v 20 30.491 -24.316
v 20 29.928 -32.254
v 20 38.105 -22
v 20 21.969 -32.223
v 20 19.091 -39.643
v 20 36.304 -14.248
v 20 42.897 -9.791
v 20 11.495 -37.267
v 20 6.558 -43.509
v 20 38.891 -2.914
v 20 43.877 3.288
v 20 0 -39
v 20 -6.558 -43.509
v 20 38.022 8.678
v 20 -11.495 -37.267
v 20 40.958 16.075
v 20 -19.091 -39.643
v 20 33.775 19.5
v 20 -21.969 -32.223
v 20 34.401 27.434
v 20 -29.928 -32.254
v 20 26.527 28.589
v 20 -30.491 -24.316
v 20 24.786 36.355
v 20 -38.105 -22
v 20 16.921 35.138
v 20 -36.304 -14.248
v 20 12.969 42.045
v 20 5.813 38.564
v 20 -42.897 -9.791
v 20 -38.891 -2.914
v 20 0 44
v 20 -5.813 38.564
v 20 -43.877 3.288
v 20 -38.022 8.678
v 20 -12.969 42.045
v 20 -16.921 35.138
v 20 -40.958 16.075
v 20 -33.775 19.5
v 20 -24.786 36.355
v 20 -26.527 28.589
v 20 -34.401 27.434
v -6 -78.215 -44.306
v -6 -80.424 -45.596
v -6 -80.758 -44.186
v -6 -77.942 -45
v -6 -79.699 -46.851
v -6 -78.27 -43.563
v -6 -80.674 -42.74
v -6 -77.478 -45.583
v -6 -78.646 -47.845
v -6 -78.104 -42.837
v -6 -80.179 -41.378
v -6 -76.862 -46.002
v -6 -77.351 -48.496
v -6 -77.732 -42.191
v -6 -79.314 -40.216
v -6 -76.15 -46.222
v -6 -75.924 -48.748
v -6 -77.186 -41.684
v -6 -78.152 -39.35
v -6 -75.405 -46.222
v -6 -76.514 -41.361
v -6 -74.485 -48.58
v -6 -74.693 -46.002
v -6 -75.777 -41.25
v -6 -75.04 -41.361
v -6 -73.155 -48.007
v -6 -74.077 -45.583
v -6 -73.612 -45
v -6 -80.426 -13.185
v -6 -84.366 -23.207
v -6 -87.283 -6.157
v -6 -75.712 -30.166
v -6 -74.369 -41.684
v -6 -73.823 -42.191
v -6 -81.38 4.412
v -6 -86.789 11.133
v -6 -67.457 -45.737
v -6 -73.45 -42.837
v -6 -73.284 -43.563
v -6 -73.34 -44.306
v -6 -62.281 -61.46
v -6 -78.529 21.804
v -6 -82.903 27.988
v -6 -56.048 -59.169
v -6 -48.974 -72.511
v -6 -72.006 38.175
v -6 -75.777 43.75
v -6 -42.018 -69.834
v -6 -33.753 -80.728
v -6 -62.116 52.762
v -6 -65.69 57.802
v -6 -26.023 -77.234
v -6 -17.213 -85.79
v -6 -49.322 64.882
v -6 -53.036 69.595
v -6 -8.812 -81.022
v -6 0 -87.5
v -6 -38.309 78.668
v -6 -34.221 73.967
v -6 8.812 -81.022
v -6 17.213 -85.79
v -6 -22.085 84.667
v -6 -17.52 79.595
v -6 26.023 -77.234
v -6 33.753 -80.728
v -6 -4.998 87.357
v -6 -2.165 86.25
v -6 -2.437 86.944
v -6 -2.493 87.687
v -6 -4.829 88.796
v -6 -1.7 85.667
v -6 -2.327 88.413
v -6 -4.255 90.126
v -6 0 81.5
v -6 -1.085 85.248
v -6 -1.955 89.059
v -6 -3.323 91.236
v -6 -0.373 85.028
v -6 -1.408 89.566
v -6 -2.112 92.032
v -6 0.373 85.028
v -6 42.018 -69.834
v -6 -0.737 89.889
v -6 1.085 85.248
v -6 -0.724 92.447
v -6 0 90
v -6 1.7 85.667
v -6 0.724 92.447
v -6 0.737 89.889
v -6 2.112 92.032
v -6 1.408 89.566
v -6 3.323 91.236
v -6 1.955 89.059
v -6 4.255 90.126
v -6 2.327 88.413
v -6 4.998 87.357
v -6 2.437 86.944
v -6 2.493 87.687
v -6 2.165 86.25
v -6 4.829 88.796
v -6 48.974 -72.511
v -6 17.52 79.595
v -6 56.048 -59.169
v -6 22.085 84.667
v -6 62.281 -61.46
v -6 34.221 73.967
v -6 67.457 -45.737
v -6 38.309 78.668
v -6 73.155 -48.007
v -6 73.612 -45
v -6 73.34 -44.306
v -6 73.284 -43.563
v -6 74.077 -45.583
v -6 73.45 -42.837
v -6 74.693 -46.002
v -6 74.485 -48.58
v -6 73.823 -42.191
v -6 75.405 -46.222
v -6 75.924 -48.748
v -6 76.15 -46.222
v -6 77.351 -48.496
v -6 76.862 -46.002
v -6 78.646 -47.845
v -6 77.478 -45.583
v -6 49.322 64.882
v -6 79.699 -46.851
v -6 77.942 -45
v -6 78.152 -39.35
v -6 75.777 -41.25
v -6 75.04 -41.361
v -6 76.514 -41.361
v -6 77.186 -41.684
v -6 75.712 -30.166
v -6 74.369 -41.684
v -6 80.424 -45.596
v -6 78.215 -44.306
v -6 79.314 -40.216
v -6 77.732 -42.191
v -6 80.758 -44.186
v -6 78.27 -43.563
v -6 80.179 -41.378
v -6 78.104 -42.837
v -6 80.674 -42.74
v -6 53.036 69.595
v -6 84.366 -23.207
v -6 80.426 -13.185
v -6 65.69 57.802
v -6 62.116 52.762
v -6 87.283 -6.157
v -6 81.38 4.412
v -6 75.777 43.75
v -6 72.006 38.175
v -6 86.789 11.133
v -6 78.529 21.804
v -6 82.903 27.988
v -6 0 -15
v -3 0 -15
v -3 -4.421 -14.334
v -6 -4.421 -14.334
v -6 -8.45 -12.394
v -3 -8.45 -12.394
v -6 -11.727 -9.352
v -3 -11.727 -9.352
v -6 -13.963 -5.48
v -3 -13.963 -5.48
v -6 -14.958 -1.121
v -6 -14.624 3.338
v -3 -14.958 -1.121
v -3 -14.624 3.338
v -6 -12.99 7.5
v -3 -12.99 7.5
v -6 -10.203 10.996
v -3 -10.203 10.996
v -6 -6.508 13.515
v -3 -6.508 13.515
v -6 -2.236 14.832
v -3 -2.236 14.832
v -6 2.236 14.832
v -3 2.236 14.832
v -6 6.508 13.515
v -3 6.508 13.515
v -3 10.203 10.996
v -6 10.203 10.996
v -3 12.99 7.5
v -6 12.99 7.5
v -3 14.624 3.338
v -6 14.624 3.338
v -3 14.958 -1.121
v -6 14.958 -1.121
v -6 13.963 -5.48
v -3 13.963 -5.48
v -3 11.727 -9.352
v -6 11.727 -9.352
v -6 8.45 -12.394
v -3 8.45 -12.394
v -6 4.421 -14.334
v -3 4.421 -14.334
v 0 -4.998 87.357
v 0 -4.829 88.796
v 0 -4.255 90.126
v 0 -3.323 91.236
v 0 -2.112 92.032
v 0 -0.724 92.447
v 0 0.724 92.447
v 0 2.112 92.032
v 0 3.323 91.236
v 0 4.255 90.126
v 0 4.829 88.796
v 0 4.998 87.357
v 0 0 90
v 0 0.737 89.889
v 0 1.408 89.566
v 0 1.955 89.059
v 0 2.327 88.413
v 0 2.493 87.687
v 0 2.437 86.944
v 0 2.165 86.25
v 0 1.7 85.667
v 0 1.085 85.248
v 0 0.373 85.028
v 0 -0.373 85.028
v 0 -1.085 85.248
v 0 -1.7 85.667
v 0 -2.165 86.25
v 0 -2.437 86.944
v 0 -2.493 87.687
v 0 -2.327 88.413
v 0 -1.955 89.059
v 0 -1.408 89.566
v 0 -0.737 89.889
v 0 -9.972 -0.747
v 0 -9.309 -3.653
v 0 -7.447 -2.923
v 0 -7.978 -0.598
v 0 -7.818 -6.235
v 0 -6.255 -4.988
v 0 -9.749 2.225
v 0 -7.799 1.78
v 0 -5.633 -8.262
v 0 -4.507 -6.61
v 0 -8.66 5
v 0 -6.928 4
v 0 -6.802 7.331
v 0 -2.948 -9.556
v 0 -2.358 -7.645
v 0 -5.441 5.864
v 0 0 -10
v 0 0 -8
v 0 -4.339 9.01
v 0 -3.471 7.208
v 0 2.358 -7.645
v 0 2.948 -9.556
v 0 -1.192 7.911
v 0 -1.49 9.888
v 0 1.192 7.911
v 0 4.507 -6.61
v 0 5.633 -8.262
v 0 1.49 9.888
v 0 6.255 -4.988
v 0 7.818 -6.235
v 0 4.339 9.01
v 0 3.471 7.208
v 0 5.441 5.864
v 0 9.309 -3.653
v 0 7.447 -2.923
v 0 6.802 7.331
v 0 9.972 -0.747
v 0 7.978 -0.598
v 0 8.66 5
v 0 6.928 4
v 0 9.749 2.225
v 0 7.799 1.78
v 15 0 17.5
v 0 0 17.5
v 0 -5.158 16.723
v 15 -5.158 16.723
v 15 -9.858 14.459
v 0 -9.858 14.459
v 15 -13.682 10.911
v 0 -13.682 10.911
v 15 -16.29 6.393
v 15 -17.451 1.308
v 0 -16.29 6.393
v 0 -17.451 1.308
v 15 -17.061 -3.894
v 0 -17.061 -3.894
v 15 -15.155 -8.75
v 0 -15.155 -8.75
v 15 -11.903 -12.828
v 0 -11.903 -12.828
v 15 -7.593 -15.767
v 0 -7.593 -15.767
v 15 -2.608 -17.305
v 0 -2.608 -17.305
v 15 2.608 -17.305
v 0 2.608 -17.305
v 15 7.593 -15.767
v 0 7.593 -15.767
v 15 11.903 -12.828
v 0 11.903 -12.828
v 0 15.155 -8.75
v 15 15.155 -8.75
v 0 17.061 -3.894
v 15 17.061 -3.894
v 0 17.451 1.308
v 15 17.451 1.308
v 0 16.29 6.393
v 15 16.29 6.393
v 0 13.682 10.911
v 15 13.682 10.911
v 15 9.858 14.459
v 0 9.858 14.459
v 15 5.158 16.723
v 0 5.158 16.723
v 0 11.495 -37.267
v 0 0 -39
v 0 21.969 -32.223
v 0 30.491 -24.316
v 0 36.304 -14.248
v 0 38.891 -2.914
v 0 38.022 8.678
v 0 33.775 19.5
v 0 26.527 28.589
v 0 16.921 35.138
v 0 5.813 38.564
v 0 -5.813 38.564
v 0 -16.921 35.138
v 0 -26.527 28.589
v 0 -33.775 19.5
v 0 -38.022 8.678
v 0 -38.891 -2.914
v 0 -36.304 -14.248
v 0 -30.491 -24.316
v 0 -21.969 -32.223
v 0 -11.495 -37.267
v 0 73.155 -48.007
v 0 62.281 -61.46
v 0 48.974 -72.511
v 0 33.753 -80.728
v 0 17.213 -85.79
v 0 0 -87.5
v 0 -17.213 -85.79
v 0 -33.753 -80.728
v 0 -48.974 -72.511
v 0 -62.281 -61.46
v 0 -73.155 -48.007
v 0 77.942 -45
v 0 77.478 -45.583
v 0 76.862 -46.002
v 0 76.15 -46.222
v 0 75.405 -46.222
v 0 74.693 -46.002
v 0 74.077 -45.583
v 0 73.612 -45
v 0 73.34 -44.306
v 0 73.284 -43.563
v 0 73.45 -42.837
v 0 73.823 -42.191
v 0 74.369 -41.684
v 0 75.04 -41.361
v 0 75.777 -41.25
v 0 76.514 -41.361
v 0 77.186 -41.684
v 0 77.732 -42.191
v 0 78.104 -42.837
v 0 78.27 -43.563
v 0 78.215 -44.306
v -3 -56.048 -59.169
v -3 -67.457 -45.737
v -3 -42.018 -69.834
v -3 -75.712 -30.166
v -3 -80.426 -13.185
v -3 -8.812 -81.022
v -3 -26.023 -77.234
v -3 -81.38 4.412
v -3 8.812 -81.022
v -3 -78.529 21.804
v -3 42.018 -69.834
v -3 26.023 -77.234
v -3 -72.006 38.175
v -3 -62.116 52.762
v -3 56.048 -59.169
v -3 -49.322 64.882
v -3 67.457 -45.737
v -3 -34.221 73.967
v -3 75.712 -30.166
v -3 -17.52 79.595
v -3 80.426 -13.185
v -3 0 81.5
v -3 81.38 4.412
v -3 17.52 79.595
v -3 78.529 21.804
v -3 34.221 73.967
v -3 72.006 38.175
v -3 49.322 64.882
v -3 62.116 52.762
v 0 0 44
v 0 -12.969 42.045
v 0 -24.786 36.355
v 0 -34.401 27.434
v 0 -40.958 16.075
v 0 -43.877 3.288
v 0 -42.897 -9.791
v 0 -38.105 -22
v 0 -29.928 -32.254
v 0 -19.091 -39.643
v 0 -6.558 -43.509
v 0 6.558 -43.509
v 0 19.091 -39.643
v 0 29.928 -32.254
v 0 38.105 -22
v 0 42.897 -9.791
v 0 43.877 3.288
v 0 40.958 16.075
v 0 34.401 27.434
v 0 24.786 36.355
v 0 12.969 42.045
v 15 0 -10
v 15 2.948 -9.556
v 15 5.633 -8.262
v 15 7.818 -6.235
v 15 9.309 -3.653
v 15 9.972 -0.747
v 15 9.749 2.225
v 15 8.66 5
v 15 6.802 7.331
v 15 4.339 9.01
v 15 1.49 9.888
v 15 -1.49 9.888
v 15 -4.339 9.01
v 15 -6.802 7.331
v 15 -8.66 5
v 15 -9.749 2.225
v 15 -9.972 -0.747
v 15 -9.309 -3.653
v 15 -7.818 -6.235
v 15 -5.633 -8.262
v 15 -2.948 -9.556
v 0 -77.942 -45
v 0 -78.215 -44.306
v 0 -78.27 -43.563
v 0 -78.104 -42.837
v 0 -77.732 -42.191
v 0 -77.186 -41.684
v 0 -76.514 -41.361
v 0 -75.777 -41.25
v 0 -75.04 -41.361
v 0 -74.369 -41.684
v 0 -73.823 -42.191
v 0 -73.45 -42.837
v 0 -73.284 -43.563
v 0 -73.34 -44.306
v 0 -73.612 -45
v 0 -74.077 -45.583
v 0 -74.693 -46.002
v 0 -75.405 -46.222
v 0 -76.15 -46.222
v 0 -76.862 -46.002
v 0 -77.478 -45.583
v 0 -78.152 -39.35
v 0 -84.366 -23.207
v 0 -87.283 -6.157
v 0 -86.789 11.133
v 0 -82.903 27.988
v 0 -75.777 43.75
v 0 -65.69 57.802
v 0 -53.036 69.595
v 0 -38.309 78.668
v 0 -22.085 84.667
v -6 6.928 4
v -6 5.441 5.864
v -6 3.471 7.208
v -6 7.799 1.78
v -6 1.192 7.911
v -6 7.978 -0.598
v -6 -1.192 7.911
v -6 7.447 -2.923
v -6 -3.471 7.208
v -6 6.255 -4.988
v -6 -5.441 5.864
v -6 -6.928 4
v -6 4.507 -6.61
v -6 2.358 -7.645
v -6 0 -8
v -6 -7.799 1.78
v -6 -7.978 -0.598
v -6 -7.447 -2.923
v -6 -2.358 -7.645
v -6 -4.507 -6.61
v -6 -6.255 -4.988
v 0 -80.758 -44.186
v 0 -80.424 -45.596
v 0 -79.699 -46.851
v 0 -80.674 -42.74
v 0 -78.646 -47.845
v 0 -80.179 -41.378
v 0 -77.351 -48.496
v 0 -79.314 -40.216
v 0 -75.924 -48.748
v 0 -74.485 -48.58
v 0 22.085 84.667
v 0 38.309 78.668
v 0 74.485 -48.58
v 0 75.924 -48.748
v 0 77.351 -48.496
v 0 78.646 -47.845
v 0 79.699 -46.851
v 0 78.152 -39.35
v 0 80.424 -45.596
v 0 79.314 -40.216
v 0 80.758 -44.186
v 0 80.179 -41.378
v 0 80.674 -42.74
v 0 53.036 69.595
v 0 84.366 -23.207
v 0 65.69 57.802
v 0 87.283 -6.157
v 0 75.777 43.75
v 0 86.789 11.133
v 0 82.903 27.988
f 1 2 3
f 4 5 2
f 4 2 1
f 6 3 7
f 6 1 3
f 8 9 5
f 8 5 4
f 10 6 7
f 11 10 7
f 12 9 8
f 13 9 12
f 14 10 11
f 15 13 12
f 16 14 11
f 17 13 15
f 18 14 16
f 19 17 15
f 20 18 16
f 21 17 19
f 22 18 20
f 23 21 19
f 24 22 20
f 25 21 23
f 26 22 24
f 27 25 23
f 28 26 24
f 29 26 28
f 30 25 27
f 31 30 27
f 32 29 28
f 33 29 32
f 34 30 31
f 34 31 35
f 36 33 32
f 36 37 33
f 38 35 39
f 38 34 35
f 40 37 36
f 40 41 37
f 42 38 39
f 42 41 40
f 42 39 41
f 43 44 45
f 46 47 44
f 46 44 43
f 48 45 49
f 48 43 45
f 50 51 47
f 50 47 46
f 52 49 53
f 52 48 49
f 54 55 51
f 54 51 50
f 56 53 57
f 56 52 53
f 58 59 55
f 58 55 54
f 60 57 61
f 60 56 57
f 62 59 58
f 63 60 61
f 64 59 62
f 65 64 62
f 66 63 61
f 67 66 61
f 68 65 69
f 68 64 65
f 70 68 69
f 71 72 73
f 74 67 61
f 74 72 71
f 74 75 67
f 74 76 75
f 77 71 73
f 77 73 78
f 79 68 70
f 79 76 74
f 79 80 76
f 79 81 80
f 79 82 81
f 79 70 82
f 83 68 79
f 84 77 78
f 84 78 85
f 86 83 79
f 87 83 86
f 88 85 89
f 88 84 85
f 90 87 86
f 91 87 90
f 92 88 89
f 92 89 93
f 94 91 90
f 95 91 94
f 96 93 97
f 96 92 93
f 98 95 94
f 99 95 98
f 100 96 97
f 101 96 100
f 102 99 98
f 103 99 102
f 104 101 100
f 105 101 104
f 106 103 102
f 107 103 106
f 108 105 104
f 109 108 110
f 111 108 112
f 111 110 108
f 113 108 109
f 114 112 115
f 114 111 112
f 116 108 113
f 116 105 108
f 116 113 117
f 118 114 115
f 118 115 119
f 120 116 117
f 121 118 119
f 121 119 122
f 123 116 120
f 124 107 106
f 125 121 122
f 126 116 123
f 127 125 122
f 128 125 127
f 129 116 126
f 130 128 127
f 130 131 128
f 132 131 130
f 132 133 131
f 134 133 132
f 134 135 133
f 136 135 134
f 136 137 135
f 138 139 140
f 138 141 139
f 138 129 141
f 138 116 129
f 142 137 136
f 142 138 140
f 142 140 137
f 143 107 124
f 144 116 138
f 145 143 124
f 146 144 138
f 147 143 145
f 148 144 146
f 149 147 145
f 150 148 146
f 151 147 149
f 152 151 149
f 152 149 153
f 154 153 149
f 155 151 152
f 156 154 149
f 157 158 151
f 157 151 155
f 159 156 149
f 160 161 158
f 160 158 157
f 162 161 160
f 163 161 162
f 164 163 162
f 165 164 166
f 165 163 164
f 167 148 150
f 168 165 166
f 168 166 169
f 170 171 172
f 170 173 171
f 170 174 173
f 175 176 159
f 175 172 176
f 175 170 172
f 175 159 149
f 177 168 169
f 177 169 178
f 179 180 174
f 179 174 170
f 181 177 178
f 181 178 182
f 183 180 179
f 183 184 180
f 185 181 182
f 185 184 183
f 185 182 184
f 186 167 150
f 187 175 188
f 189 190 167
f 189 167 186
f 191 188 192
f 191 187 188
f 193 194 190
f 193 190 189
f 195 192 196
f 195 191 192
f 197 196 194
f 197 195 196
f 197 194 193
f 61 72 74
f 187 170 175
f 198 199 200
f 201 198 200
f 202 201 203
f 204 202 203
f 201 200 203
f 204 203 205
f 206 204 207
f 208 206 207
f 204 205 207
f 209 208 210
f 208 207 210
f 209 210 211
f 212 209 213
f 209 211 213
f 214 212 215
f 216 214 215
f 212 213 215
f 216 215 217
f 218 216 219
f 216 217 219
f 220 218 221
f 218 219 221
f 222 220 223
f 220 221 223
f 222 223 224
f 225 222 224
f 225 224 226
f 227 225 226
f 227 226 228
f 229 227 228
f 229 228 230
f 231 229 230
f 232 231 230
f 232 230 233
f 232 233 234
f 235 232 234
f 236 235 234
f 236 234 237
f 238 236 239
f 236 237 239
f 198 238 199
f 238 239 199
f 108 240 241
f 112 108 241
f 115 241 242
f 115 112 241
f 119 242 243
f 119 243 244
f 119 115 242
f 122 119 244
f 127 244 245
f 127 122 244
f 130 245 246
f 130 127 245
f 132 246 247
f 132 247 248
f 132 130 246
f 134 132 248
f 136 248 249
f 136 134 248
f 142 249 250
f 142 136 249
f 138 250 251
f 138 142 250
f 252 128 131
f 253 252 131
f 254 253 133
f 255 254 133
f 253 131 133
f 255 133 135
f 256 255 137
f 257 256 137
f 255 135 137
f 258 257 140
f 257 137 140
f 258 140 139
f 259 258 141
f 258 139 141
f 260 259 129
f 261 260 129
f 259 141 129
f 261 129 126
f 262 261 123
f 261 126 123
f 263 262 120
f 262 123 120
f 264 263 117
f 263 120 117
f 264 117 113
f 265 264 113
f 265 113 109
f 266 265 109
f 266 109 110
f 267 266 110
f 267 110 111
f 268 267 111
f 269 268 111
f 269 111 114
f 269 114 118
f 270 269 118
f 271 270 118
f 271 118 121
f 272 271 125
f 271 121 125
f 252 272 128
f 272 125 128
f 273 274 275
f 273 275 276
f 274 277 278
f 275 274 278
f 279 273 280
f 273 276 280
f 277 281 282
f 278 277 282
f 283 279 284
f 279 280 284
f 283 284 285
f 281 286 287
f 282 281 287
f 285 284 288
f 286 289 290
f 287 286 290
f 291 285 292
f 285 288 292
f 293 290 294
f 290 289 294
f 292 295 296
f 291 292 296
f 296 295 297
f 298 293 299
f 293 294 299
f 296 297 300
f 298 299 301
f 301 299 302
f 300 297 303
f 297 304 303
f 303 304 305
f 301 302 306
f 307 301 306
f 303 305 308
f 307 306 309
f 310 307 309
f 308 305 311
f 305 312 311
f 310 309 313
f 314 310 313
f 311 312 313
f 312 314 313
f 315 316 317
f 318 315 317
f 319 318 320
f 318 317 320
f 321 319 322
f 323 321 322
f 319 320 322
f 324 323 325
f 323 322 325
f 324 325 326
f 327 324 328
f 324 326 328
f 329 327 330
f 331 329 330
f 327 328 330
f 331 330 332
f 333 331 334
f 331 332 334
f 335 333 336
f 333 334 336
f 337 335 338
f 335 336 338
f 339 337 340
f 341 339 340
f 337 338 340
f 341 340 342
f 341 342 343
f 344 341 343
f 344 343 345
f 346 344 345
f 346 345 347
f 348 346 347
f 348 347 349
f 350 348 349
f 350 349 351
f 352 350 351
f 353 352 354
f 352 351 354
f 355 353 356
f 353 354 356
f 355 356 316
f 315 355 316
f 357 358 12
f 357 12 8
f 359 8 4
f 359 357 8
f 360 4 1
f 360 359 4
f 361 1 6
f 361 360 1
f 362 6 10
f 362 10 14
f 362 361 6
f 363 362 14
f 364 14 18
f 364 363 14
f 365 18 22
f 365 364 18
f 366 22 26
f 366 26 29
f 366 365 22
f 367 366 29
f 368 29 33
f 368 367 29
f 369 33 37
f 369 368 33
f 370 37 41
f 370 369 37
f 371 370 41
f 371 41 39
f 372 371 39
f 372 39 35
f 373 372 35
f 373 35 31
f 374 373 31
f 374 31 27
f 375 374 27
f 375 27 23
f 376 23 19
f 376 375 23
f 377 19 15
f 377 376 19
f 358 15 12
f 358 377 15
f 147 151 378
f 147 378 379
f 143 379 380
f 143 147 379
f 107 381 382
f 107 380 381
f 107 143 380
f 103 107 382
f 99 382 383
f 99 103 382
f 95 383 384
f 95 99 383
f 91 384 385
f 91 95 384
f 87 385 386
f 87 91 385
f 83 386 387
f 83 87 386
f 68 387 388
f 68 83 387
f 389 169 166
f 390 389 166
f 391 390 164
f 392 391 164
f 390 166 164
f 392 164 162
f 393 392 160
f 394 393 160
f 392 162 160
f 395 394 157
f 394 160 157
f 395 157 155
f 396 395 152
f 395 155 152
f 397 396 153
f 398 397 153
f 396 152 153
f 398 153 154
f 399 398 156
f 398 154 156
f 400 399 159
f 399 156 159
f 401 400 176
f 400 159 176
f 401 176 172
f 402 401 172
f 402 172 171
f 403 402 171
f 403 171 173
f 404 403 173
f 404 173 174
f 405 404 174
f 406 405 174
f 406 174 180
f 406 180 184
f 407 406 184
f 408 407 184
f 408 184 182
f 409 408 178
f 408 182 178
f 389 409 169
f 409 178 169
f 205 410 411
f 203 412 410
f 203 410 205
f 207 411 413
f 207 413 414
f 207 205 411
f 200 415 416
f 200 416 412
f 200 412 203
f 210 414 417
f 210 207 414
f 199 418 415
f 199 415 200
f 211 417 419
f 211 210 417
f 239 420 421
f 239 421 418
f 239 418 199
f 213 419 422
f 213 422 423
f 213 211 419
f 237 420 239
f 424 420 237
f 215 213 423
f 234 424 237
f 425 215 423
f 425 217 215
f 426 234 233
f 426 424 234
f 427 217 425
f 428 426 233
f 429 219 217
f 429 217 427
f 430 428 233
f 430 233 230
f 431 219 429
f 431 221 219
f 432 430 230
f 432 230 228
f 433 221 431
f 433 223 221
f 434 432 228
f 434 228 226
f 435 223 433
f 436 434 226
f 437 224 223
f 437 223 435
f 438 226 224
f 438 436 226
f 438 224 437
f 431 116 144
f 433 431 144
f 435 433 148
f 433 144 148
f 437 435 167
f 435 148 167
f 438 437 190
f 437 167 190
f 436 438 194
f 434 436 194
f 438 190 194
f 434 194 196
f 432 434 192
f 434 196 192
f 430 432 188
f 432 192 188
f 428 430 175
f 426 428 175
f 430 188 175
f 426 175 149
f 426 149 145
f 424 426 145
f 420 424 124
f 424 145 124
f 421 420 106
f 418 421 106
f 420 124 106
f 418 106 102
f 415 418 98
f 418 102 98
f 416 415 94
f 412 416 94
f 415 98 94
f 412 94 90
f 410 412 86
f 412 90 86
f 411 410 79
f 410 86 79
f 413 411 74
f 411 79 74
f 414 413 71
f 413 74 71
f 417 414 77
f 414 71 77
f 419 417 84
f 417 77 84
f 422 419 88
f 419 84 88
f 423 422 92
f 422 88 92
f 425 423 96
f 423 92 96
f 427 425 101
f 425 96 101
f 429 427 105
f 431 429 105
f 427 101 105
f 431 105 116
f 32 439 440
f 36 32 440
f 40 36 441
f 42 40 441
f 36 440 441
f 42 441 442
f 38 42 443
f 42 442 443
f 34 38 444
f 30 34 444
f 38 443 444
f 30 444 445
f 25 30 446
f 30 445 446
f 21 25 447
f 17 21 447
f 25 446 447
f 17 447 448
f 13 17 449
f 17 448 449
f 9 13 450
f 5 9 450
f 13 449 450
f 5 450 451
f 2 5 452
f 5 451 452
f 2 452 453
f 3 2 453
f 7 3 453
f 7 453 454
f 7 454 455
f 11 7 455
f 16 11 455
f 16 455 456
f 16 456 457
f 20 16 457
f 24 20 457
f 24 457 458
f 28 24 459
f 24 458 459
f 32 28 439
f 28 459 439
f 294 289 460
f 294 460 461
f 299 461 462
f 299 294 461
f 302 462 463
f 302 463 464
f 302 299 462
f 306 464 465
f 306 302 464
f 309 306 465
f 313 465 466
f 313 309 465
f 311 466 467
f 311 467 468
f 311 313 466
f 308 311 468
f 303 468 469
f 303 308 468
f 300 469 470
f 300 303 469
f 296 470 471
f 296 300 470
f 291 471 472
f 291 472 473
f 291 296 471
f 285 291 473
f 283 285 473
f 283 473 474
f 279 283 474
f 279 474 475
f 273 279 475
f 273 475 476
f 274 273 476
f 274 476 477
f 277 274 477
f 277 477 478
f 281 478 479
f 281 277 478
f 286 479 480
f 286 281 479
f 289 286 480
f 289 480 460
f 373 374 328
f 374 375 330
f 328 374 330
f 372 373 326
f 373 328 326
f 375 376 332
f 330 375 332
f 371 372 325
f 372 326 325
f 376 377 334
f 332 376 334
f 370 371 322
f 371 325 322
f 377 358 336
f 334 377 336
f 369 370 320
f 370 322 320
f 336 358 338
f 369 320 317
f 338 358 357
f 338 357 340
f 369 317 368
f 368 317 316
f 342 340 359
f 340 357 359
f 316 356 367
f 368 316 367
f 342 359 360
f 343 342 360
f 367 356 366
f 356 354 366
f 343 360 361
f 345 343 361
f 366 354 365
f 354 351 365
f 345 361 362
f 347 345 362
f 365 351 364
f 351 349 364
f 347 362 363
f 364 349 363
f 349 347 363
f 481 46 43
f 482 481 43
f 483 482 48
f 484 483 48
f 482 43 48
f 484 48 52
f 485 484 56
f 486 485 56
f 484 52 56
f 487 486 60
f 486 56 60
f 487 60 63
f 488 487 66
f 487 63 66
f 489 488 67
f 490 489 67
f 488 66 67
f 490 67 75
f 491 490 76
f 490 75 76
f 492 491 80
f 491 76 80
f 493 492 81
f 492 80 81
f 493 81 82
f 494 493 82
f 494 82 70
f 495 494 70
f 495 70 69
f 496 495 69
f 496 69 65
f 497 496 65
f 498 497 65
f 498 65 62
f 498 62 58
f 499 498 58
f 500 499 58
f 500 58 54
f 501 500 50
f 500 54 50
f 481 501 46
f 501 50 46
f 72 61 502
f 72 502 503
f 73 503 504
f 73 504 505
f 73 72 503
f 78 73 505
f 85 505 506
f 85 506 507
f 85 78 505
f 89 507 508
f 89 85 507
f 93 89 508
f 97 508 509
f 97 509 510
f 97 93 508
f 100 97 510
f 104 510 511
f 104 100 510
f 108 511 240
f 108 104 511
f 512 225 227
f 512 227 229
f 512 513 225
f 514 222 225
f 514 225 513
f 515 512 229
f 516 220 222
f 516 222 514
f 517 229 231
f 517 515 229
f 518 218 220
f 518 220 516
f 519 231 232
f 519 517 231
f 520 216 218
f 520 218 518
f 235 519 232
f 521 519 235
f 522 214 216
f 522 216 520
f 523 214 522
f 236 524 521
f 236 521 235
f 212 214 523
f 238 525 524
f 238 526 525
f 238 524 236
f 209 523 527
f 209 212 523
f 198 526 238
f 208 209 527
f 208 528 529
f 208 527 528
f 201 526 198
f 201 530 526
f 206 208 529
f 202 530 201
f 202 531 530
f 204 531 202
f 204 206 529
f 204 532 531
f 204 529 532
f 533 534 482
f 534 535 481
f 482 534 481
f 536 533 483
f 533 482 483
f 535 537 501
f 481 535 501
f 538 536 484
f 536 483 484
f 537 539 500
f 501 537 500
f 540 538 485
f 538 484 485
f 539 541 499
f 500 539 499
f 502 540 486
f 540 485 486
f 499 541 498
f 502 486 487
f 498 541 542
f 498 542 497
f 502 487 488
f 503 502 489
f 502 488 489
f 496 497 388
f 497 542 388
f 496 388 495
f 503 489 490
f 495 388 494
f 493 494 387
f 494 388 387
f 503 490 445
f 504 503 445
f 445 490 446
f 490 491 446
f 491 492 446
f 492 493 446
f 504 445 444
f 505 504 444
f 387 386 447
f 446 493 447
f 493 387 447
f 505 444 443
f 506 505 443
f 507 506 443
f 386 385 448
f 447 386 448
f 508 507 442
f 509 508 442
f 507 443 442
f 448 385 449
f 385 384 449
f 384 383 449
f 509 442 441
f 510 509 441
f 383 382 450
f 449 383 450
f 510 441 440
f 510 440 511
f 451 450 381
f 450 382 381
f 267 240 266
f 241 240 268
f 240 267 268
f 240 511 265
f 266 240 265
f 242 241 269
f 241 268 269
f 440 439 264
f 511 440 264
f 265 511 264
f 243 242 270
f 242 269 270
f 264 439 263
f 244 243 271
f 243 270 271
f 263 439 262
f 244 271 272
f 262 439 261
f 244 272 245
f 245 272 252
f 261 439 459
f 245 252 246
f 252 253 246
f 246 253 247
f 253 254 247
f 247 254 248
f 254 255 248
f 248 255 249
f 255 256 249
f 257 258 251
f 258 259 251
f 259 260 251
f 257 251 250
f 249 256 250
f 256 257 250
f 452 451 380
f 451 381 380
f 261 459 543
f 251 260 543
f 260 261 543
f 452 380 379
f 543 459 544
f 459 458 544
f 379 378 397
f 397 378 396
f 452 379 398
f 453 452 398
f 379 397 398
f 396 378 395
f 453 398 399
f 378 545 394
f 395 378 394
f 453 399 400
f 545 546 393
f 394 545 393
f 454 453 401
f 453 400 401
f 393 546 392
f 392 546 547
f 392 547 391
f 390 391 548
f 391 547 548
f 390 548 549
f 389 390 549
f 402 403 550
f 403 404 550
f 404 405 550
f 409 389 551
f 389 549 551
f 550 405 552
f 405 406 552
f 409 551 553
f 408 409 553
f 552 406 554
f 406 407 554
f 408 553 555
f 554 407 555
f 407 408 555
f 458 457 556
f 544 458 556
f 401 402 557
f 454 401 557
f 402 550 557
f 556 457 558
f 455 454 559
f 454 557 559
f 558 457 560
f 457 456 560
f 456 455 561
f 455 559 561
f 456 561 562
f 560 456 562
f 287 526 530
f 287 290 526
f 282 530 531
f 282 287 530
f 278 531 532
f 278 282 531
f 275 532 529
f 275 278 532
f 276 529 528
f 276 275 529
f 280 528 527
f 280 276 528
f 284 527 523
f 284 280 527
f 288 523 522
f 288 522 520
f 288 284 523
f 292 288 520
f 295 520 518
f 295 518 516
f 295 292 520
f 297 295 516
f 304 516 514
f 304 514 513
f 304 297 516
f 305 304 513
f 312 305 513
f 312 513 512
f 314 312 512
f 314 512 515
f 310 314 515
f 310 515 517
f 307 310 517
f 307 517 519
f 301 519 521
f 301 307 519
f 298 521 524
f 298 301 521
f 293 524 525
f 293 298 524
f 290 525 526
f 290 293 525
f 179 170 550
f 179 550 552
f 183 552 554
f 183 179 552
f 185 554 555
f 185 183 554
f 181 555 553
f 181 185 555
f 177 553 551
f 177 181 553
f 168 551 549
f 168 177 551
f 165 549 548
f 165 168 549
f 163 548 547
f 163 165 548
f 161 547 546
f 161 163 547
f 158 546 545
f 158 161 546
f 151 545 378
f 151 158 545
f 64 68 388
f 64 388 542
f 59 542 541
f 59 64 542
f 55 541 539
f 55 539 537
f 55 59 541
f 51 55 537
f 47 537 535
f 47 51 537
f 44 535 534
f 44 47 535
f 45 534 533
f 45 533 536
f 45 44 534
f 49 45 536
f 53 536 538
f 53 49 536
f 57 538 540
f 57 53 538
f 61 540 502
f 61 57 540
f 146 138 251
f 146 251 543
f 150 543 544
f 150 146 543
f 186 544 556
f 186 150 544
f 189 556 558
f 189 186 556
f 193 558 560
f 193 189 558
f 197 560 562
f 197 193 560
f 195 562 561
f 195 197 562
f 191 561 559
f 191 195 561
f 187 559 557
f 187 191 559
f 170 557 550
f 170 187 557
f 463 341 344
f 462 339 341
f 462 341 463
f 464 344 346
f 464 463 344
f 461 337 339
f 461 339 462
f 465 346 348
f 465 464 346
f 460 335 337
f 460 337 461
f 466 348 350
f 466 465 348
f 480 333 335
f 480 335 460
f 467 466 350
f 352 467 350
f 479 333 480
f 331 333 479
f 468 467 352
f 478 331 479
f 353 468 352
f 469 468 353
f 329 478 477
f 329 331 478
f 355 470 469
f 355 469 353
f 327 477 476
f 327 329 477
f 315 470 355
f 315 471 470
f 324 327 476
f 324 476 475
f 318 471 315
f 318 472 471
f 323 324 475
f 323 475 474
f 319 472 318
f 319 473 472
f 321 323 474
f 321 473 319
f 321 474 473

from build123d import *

# Parameters (mm, degrees)
SKETCH1_W           = 6
SKETCH1_H           = 87.5
SKETCH3_R           = 8
CUT_EXTRUDE2_DEPTH  = 30
SKETCH4_R           = 5
BOSS_EXTRUDE1_DEPTH = 6
CIRPATTERN2_COUNT   = 3
SKETCH6_R           = 2.5
CUT_EXTRUDE3_DEPTH  = 6
CIRPATTERN3_COUNT   = 3
SKETCH8_R           = 17.5
SKETCH8_R_2         = 10
BOSS_EXTRUDE2_DEPTH = 15
SKETCH10_R          = 44
SKETCH10_R_2        = 39
BOSS_EXTRUDE3_DEPTH = 20
SKETCH11_R          = 81.5
CUT_EXTRUDE4_DEPTH  = 3
SKETCH12_R          = 15
SKETCH12_R_2        = 8
BOSS_EXTRUDE4_DEPTH = 3


with BuildPart() as part:
    # Sketch1 → Revolve1 (revolve)
    with BuildSketch(Plane(origin=(0, 0, 0), x_dir=(-1, 0, 0), z_dir=(0, 1, 0)), mode=Mode.PRIVATE) as revolve1_sk:
        with Locations((3, 43.75)):
            Rectangle(SKETCH1_W, SKETCH1_H)
    revolve(revolve1_sk.sketch.rotate(Axis((38.11091851, 0, 0), (-1, 0, 0)), 180), axis=Axis((38.11091851, 0, 0), (-1, 0, 0)))

    # Sketch3 → Cut-Extrude2 (cut)
    with BuildSketch(Plane.YZ):
        with Locations(Location((0, 0, 0), (0, 0, 270))):
            Circle(SKETCH3_R)
    extrude(amount=-CUT_EXTRUDE2_DEPTH, mode=Mode.SUBTRACT)

    # Sketch4 → Boss-Extrude1 (add)
    with BuildSketch(Plane(origin=(-6, 0, 0), x_dir=(0, -1, 0), z_dir=(-1, 0, 0))):
        with Locations((0, 87.5)):
            Circle(SKETCH4_R)
    boss_extrude1 = extrude(amount=-BOSS_EXTRUDE1_DEPTH)

    # CirPattern2: Boss-Extrude1 ×3 about axis
    cirpattern2_axis = Axis((0, 0, 0), (1, 0, 0))
    for i in range(1, CIRPATTERN2_COUNT):
        add(boss_extrude1.rotate(cirpattern2_axis, i * 360 / CIRPATTERN2_COUNT))

    # Sketch6 → Cut-Extrude3 (cut)
    with BuildSketch(Plane(origin=(-6, 0, 0), x_dir=(0, -1, 0), z_dir=(-1, 0, 0))):
        with Locations(Location((0, 87.5, 0), (0, 0, 90))):
            Circle(SKETCH6_R)
    cut_extrude3 = extrude(amount=-CUT_EXTRUDE3_DEPTH, mode=Mode.SUBTRACT)

    # CirPattern3: Cut-Extrude3 ×3 about axis
    cirpattern3_axis = Axis((0, 0, 0), (1, 0, 0))
    for i in range(1, CIRPATTERN3_COUNT):
        add(cut_extrude3.rotate(cirpattern3_axis, i * 360 / CIRPATTERN3_COUNT), mode=Mode.SUBTRACT)

    # Sketch8 → Boss-Extrude2 (add)
    with BuildSketch(Plane.YZ):
        with Locations(Location((0, 0, 0), (0, 0, 90))):
            Circle(SKETCH8_R)
        with Locations(Location((0, 0, 0), (0, 0, 270))):
            Circle(SKETCH8_R_2, mode=Mode.SUBTRACT)
    extrude(amount=BOSS_EXTRUDE2_DEPTH)

    # Sketch10 → Boss-Extrude3 (add)
    with BuildSketch(Plane.YZ):
        with Locations(Location((0, 0, 0), (0, 0, 90))):
            Circle(SKETCH10_R)
        with Locations(Location((0, 0, 0), (0, 0, 270))):
            Circle(SKETCH10_R_2, mode=Mode.SUBTRACT)
    extrude(amount=BOSS_EXTRUDE3_DEPTH)

    # Sketch11 → Cut-Extrude4 (cut)
    with BuildSketch(Plane(origin=(-6, 0, 0), x_dir=(0, -1, 0), z_dir=(-1, 0, 0))):
        with Locations(Location((0, 0, 0), (0, 0, 90))):
            Circle(SKETCH11_R)
    extrude(amount=-CUT_EXTRUDE4_DEPTH, mode=Mode.SUBTRACT)

    # Sketch12 → Boss-Extrude4 (add)
    with BuildSketch(Plane(origin=(-3, 0, 0), x_dir=(0, -1, 0), z_dir=(-1, 0, 0))):
        with Locations(Location((0, 0, 0), (0, 0, 270))):
            Circle(SKETCH12_R)
        with Locations(Location((0, 0, 0), (0, 0, 270))):
            Circle(SKETCH12_R_2, mode=Mode.SUBTRACT)
    extrude(amount=BOSS_EXTRUDE4_DEPTH)


solid = part.part
